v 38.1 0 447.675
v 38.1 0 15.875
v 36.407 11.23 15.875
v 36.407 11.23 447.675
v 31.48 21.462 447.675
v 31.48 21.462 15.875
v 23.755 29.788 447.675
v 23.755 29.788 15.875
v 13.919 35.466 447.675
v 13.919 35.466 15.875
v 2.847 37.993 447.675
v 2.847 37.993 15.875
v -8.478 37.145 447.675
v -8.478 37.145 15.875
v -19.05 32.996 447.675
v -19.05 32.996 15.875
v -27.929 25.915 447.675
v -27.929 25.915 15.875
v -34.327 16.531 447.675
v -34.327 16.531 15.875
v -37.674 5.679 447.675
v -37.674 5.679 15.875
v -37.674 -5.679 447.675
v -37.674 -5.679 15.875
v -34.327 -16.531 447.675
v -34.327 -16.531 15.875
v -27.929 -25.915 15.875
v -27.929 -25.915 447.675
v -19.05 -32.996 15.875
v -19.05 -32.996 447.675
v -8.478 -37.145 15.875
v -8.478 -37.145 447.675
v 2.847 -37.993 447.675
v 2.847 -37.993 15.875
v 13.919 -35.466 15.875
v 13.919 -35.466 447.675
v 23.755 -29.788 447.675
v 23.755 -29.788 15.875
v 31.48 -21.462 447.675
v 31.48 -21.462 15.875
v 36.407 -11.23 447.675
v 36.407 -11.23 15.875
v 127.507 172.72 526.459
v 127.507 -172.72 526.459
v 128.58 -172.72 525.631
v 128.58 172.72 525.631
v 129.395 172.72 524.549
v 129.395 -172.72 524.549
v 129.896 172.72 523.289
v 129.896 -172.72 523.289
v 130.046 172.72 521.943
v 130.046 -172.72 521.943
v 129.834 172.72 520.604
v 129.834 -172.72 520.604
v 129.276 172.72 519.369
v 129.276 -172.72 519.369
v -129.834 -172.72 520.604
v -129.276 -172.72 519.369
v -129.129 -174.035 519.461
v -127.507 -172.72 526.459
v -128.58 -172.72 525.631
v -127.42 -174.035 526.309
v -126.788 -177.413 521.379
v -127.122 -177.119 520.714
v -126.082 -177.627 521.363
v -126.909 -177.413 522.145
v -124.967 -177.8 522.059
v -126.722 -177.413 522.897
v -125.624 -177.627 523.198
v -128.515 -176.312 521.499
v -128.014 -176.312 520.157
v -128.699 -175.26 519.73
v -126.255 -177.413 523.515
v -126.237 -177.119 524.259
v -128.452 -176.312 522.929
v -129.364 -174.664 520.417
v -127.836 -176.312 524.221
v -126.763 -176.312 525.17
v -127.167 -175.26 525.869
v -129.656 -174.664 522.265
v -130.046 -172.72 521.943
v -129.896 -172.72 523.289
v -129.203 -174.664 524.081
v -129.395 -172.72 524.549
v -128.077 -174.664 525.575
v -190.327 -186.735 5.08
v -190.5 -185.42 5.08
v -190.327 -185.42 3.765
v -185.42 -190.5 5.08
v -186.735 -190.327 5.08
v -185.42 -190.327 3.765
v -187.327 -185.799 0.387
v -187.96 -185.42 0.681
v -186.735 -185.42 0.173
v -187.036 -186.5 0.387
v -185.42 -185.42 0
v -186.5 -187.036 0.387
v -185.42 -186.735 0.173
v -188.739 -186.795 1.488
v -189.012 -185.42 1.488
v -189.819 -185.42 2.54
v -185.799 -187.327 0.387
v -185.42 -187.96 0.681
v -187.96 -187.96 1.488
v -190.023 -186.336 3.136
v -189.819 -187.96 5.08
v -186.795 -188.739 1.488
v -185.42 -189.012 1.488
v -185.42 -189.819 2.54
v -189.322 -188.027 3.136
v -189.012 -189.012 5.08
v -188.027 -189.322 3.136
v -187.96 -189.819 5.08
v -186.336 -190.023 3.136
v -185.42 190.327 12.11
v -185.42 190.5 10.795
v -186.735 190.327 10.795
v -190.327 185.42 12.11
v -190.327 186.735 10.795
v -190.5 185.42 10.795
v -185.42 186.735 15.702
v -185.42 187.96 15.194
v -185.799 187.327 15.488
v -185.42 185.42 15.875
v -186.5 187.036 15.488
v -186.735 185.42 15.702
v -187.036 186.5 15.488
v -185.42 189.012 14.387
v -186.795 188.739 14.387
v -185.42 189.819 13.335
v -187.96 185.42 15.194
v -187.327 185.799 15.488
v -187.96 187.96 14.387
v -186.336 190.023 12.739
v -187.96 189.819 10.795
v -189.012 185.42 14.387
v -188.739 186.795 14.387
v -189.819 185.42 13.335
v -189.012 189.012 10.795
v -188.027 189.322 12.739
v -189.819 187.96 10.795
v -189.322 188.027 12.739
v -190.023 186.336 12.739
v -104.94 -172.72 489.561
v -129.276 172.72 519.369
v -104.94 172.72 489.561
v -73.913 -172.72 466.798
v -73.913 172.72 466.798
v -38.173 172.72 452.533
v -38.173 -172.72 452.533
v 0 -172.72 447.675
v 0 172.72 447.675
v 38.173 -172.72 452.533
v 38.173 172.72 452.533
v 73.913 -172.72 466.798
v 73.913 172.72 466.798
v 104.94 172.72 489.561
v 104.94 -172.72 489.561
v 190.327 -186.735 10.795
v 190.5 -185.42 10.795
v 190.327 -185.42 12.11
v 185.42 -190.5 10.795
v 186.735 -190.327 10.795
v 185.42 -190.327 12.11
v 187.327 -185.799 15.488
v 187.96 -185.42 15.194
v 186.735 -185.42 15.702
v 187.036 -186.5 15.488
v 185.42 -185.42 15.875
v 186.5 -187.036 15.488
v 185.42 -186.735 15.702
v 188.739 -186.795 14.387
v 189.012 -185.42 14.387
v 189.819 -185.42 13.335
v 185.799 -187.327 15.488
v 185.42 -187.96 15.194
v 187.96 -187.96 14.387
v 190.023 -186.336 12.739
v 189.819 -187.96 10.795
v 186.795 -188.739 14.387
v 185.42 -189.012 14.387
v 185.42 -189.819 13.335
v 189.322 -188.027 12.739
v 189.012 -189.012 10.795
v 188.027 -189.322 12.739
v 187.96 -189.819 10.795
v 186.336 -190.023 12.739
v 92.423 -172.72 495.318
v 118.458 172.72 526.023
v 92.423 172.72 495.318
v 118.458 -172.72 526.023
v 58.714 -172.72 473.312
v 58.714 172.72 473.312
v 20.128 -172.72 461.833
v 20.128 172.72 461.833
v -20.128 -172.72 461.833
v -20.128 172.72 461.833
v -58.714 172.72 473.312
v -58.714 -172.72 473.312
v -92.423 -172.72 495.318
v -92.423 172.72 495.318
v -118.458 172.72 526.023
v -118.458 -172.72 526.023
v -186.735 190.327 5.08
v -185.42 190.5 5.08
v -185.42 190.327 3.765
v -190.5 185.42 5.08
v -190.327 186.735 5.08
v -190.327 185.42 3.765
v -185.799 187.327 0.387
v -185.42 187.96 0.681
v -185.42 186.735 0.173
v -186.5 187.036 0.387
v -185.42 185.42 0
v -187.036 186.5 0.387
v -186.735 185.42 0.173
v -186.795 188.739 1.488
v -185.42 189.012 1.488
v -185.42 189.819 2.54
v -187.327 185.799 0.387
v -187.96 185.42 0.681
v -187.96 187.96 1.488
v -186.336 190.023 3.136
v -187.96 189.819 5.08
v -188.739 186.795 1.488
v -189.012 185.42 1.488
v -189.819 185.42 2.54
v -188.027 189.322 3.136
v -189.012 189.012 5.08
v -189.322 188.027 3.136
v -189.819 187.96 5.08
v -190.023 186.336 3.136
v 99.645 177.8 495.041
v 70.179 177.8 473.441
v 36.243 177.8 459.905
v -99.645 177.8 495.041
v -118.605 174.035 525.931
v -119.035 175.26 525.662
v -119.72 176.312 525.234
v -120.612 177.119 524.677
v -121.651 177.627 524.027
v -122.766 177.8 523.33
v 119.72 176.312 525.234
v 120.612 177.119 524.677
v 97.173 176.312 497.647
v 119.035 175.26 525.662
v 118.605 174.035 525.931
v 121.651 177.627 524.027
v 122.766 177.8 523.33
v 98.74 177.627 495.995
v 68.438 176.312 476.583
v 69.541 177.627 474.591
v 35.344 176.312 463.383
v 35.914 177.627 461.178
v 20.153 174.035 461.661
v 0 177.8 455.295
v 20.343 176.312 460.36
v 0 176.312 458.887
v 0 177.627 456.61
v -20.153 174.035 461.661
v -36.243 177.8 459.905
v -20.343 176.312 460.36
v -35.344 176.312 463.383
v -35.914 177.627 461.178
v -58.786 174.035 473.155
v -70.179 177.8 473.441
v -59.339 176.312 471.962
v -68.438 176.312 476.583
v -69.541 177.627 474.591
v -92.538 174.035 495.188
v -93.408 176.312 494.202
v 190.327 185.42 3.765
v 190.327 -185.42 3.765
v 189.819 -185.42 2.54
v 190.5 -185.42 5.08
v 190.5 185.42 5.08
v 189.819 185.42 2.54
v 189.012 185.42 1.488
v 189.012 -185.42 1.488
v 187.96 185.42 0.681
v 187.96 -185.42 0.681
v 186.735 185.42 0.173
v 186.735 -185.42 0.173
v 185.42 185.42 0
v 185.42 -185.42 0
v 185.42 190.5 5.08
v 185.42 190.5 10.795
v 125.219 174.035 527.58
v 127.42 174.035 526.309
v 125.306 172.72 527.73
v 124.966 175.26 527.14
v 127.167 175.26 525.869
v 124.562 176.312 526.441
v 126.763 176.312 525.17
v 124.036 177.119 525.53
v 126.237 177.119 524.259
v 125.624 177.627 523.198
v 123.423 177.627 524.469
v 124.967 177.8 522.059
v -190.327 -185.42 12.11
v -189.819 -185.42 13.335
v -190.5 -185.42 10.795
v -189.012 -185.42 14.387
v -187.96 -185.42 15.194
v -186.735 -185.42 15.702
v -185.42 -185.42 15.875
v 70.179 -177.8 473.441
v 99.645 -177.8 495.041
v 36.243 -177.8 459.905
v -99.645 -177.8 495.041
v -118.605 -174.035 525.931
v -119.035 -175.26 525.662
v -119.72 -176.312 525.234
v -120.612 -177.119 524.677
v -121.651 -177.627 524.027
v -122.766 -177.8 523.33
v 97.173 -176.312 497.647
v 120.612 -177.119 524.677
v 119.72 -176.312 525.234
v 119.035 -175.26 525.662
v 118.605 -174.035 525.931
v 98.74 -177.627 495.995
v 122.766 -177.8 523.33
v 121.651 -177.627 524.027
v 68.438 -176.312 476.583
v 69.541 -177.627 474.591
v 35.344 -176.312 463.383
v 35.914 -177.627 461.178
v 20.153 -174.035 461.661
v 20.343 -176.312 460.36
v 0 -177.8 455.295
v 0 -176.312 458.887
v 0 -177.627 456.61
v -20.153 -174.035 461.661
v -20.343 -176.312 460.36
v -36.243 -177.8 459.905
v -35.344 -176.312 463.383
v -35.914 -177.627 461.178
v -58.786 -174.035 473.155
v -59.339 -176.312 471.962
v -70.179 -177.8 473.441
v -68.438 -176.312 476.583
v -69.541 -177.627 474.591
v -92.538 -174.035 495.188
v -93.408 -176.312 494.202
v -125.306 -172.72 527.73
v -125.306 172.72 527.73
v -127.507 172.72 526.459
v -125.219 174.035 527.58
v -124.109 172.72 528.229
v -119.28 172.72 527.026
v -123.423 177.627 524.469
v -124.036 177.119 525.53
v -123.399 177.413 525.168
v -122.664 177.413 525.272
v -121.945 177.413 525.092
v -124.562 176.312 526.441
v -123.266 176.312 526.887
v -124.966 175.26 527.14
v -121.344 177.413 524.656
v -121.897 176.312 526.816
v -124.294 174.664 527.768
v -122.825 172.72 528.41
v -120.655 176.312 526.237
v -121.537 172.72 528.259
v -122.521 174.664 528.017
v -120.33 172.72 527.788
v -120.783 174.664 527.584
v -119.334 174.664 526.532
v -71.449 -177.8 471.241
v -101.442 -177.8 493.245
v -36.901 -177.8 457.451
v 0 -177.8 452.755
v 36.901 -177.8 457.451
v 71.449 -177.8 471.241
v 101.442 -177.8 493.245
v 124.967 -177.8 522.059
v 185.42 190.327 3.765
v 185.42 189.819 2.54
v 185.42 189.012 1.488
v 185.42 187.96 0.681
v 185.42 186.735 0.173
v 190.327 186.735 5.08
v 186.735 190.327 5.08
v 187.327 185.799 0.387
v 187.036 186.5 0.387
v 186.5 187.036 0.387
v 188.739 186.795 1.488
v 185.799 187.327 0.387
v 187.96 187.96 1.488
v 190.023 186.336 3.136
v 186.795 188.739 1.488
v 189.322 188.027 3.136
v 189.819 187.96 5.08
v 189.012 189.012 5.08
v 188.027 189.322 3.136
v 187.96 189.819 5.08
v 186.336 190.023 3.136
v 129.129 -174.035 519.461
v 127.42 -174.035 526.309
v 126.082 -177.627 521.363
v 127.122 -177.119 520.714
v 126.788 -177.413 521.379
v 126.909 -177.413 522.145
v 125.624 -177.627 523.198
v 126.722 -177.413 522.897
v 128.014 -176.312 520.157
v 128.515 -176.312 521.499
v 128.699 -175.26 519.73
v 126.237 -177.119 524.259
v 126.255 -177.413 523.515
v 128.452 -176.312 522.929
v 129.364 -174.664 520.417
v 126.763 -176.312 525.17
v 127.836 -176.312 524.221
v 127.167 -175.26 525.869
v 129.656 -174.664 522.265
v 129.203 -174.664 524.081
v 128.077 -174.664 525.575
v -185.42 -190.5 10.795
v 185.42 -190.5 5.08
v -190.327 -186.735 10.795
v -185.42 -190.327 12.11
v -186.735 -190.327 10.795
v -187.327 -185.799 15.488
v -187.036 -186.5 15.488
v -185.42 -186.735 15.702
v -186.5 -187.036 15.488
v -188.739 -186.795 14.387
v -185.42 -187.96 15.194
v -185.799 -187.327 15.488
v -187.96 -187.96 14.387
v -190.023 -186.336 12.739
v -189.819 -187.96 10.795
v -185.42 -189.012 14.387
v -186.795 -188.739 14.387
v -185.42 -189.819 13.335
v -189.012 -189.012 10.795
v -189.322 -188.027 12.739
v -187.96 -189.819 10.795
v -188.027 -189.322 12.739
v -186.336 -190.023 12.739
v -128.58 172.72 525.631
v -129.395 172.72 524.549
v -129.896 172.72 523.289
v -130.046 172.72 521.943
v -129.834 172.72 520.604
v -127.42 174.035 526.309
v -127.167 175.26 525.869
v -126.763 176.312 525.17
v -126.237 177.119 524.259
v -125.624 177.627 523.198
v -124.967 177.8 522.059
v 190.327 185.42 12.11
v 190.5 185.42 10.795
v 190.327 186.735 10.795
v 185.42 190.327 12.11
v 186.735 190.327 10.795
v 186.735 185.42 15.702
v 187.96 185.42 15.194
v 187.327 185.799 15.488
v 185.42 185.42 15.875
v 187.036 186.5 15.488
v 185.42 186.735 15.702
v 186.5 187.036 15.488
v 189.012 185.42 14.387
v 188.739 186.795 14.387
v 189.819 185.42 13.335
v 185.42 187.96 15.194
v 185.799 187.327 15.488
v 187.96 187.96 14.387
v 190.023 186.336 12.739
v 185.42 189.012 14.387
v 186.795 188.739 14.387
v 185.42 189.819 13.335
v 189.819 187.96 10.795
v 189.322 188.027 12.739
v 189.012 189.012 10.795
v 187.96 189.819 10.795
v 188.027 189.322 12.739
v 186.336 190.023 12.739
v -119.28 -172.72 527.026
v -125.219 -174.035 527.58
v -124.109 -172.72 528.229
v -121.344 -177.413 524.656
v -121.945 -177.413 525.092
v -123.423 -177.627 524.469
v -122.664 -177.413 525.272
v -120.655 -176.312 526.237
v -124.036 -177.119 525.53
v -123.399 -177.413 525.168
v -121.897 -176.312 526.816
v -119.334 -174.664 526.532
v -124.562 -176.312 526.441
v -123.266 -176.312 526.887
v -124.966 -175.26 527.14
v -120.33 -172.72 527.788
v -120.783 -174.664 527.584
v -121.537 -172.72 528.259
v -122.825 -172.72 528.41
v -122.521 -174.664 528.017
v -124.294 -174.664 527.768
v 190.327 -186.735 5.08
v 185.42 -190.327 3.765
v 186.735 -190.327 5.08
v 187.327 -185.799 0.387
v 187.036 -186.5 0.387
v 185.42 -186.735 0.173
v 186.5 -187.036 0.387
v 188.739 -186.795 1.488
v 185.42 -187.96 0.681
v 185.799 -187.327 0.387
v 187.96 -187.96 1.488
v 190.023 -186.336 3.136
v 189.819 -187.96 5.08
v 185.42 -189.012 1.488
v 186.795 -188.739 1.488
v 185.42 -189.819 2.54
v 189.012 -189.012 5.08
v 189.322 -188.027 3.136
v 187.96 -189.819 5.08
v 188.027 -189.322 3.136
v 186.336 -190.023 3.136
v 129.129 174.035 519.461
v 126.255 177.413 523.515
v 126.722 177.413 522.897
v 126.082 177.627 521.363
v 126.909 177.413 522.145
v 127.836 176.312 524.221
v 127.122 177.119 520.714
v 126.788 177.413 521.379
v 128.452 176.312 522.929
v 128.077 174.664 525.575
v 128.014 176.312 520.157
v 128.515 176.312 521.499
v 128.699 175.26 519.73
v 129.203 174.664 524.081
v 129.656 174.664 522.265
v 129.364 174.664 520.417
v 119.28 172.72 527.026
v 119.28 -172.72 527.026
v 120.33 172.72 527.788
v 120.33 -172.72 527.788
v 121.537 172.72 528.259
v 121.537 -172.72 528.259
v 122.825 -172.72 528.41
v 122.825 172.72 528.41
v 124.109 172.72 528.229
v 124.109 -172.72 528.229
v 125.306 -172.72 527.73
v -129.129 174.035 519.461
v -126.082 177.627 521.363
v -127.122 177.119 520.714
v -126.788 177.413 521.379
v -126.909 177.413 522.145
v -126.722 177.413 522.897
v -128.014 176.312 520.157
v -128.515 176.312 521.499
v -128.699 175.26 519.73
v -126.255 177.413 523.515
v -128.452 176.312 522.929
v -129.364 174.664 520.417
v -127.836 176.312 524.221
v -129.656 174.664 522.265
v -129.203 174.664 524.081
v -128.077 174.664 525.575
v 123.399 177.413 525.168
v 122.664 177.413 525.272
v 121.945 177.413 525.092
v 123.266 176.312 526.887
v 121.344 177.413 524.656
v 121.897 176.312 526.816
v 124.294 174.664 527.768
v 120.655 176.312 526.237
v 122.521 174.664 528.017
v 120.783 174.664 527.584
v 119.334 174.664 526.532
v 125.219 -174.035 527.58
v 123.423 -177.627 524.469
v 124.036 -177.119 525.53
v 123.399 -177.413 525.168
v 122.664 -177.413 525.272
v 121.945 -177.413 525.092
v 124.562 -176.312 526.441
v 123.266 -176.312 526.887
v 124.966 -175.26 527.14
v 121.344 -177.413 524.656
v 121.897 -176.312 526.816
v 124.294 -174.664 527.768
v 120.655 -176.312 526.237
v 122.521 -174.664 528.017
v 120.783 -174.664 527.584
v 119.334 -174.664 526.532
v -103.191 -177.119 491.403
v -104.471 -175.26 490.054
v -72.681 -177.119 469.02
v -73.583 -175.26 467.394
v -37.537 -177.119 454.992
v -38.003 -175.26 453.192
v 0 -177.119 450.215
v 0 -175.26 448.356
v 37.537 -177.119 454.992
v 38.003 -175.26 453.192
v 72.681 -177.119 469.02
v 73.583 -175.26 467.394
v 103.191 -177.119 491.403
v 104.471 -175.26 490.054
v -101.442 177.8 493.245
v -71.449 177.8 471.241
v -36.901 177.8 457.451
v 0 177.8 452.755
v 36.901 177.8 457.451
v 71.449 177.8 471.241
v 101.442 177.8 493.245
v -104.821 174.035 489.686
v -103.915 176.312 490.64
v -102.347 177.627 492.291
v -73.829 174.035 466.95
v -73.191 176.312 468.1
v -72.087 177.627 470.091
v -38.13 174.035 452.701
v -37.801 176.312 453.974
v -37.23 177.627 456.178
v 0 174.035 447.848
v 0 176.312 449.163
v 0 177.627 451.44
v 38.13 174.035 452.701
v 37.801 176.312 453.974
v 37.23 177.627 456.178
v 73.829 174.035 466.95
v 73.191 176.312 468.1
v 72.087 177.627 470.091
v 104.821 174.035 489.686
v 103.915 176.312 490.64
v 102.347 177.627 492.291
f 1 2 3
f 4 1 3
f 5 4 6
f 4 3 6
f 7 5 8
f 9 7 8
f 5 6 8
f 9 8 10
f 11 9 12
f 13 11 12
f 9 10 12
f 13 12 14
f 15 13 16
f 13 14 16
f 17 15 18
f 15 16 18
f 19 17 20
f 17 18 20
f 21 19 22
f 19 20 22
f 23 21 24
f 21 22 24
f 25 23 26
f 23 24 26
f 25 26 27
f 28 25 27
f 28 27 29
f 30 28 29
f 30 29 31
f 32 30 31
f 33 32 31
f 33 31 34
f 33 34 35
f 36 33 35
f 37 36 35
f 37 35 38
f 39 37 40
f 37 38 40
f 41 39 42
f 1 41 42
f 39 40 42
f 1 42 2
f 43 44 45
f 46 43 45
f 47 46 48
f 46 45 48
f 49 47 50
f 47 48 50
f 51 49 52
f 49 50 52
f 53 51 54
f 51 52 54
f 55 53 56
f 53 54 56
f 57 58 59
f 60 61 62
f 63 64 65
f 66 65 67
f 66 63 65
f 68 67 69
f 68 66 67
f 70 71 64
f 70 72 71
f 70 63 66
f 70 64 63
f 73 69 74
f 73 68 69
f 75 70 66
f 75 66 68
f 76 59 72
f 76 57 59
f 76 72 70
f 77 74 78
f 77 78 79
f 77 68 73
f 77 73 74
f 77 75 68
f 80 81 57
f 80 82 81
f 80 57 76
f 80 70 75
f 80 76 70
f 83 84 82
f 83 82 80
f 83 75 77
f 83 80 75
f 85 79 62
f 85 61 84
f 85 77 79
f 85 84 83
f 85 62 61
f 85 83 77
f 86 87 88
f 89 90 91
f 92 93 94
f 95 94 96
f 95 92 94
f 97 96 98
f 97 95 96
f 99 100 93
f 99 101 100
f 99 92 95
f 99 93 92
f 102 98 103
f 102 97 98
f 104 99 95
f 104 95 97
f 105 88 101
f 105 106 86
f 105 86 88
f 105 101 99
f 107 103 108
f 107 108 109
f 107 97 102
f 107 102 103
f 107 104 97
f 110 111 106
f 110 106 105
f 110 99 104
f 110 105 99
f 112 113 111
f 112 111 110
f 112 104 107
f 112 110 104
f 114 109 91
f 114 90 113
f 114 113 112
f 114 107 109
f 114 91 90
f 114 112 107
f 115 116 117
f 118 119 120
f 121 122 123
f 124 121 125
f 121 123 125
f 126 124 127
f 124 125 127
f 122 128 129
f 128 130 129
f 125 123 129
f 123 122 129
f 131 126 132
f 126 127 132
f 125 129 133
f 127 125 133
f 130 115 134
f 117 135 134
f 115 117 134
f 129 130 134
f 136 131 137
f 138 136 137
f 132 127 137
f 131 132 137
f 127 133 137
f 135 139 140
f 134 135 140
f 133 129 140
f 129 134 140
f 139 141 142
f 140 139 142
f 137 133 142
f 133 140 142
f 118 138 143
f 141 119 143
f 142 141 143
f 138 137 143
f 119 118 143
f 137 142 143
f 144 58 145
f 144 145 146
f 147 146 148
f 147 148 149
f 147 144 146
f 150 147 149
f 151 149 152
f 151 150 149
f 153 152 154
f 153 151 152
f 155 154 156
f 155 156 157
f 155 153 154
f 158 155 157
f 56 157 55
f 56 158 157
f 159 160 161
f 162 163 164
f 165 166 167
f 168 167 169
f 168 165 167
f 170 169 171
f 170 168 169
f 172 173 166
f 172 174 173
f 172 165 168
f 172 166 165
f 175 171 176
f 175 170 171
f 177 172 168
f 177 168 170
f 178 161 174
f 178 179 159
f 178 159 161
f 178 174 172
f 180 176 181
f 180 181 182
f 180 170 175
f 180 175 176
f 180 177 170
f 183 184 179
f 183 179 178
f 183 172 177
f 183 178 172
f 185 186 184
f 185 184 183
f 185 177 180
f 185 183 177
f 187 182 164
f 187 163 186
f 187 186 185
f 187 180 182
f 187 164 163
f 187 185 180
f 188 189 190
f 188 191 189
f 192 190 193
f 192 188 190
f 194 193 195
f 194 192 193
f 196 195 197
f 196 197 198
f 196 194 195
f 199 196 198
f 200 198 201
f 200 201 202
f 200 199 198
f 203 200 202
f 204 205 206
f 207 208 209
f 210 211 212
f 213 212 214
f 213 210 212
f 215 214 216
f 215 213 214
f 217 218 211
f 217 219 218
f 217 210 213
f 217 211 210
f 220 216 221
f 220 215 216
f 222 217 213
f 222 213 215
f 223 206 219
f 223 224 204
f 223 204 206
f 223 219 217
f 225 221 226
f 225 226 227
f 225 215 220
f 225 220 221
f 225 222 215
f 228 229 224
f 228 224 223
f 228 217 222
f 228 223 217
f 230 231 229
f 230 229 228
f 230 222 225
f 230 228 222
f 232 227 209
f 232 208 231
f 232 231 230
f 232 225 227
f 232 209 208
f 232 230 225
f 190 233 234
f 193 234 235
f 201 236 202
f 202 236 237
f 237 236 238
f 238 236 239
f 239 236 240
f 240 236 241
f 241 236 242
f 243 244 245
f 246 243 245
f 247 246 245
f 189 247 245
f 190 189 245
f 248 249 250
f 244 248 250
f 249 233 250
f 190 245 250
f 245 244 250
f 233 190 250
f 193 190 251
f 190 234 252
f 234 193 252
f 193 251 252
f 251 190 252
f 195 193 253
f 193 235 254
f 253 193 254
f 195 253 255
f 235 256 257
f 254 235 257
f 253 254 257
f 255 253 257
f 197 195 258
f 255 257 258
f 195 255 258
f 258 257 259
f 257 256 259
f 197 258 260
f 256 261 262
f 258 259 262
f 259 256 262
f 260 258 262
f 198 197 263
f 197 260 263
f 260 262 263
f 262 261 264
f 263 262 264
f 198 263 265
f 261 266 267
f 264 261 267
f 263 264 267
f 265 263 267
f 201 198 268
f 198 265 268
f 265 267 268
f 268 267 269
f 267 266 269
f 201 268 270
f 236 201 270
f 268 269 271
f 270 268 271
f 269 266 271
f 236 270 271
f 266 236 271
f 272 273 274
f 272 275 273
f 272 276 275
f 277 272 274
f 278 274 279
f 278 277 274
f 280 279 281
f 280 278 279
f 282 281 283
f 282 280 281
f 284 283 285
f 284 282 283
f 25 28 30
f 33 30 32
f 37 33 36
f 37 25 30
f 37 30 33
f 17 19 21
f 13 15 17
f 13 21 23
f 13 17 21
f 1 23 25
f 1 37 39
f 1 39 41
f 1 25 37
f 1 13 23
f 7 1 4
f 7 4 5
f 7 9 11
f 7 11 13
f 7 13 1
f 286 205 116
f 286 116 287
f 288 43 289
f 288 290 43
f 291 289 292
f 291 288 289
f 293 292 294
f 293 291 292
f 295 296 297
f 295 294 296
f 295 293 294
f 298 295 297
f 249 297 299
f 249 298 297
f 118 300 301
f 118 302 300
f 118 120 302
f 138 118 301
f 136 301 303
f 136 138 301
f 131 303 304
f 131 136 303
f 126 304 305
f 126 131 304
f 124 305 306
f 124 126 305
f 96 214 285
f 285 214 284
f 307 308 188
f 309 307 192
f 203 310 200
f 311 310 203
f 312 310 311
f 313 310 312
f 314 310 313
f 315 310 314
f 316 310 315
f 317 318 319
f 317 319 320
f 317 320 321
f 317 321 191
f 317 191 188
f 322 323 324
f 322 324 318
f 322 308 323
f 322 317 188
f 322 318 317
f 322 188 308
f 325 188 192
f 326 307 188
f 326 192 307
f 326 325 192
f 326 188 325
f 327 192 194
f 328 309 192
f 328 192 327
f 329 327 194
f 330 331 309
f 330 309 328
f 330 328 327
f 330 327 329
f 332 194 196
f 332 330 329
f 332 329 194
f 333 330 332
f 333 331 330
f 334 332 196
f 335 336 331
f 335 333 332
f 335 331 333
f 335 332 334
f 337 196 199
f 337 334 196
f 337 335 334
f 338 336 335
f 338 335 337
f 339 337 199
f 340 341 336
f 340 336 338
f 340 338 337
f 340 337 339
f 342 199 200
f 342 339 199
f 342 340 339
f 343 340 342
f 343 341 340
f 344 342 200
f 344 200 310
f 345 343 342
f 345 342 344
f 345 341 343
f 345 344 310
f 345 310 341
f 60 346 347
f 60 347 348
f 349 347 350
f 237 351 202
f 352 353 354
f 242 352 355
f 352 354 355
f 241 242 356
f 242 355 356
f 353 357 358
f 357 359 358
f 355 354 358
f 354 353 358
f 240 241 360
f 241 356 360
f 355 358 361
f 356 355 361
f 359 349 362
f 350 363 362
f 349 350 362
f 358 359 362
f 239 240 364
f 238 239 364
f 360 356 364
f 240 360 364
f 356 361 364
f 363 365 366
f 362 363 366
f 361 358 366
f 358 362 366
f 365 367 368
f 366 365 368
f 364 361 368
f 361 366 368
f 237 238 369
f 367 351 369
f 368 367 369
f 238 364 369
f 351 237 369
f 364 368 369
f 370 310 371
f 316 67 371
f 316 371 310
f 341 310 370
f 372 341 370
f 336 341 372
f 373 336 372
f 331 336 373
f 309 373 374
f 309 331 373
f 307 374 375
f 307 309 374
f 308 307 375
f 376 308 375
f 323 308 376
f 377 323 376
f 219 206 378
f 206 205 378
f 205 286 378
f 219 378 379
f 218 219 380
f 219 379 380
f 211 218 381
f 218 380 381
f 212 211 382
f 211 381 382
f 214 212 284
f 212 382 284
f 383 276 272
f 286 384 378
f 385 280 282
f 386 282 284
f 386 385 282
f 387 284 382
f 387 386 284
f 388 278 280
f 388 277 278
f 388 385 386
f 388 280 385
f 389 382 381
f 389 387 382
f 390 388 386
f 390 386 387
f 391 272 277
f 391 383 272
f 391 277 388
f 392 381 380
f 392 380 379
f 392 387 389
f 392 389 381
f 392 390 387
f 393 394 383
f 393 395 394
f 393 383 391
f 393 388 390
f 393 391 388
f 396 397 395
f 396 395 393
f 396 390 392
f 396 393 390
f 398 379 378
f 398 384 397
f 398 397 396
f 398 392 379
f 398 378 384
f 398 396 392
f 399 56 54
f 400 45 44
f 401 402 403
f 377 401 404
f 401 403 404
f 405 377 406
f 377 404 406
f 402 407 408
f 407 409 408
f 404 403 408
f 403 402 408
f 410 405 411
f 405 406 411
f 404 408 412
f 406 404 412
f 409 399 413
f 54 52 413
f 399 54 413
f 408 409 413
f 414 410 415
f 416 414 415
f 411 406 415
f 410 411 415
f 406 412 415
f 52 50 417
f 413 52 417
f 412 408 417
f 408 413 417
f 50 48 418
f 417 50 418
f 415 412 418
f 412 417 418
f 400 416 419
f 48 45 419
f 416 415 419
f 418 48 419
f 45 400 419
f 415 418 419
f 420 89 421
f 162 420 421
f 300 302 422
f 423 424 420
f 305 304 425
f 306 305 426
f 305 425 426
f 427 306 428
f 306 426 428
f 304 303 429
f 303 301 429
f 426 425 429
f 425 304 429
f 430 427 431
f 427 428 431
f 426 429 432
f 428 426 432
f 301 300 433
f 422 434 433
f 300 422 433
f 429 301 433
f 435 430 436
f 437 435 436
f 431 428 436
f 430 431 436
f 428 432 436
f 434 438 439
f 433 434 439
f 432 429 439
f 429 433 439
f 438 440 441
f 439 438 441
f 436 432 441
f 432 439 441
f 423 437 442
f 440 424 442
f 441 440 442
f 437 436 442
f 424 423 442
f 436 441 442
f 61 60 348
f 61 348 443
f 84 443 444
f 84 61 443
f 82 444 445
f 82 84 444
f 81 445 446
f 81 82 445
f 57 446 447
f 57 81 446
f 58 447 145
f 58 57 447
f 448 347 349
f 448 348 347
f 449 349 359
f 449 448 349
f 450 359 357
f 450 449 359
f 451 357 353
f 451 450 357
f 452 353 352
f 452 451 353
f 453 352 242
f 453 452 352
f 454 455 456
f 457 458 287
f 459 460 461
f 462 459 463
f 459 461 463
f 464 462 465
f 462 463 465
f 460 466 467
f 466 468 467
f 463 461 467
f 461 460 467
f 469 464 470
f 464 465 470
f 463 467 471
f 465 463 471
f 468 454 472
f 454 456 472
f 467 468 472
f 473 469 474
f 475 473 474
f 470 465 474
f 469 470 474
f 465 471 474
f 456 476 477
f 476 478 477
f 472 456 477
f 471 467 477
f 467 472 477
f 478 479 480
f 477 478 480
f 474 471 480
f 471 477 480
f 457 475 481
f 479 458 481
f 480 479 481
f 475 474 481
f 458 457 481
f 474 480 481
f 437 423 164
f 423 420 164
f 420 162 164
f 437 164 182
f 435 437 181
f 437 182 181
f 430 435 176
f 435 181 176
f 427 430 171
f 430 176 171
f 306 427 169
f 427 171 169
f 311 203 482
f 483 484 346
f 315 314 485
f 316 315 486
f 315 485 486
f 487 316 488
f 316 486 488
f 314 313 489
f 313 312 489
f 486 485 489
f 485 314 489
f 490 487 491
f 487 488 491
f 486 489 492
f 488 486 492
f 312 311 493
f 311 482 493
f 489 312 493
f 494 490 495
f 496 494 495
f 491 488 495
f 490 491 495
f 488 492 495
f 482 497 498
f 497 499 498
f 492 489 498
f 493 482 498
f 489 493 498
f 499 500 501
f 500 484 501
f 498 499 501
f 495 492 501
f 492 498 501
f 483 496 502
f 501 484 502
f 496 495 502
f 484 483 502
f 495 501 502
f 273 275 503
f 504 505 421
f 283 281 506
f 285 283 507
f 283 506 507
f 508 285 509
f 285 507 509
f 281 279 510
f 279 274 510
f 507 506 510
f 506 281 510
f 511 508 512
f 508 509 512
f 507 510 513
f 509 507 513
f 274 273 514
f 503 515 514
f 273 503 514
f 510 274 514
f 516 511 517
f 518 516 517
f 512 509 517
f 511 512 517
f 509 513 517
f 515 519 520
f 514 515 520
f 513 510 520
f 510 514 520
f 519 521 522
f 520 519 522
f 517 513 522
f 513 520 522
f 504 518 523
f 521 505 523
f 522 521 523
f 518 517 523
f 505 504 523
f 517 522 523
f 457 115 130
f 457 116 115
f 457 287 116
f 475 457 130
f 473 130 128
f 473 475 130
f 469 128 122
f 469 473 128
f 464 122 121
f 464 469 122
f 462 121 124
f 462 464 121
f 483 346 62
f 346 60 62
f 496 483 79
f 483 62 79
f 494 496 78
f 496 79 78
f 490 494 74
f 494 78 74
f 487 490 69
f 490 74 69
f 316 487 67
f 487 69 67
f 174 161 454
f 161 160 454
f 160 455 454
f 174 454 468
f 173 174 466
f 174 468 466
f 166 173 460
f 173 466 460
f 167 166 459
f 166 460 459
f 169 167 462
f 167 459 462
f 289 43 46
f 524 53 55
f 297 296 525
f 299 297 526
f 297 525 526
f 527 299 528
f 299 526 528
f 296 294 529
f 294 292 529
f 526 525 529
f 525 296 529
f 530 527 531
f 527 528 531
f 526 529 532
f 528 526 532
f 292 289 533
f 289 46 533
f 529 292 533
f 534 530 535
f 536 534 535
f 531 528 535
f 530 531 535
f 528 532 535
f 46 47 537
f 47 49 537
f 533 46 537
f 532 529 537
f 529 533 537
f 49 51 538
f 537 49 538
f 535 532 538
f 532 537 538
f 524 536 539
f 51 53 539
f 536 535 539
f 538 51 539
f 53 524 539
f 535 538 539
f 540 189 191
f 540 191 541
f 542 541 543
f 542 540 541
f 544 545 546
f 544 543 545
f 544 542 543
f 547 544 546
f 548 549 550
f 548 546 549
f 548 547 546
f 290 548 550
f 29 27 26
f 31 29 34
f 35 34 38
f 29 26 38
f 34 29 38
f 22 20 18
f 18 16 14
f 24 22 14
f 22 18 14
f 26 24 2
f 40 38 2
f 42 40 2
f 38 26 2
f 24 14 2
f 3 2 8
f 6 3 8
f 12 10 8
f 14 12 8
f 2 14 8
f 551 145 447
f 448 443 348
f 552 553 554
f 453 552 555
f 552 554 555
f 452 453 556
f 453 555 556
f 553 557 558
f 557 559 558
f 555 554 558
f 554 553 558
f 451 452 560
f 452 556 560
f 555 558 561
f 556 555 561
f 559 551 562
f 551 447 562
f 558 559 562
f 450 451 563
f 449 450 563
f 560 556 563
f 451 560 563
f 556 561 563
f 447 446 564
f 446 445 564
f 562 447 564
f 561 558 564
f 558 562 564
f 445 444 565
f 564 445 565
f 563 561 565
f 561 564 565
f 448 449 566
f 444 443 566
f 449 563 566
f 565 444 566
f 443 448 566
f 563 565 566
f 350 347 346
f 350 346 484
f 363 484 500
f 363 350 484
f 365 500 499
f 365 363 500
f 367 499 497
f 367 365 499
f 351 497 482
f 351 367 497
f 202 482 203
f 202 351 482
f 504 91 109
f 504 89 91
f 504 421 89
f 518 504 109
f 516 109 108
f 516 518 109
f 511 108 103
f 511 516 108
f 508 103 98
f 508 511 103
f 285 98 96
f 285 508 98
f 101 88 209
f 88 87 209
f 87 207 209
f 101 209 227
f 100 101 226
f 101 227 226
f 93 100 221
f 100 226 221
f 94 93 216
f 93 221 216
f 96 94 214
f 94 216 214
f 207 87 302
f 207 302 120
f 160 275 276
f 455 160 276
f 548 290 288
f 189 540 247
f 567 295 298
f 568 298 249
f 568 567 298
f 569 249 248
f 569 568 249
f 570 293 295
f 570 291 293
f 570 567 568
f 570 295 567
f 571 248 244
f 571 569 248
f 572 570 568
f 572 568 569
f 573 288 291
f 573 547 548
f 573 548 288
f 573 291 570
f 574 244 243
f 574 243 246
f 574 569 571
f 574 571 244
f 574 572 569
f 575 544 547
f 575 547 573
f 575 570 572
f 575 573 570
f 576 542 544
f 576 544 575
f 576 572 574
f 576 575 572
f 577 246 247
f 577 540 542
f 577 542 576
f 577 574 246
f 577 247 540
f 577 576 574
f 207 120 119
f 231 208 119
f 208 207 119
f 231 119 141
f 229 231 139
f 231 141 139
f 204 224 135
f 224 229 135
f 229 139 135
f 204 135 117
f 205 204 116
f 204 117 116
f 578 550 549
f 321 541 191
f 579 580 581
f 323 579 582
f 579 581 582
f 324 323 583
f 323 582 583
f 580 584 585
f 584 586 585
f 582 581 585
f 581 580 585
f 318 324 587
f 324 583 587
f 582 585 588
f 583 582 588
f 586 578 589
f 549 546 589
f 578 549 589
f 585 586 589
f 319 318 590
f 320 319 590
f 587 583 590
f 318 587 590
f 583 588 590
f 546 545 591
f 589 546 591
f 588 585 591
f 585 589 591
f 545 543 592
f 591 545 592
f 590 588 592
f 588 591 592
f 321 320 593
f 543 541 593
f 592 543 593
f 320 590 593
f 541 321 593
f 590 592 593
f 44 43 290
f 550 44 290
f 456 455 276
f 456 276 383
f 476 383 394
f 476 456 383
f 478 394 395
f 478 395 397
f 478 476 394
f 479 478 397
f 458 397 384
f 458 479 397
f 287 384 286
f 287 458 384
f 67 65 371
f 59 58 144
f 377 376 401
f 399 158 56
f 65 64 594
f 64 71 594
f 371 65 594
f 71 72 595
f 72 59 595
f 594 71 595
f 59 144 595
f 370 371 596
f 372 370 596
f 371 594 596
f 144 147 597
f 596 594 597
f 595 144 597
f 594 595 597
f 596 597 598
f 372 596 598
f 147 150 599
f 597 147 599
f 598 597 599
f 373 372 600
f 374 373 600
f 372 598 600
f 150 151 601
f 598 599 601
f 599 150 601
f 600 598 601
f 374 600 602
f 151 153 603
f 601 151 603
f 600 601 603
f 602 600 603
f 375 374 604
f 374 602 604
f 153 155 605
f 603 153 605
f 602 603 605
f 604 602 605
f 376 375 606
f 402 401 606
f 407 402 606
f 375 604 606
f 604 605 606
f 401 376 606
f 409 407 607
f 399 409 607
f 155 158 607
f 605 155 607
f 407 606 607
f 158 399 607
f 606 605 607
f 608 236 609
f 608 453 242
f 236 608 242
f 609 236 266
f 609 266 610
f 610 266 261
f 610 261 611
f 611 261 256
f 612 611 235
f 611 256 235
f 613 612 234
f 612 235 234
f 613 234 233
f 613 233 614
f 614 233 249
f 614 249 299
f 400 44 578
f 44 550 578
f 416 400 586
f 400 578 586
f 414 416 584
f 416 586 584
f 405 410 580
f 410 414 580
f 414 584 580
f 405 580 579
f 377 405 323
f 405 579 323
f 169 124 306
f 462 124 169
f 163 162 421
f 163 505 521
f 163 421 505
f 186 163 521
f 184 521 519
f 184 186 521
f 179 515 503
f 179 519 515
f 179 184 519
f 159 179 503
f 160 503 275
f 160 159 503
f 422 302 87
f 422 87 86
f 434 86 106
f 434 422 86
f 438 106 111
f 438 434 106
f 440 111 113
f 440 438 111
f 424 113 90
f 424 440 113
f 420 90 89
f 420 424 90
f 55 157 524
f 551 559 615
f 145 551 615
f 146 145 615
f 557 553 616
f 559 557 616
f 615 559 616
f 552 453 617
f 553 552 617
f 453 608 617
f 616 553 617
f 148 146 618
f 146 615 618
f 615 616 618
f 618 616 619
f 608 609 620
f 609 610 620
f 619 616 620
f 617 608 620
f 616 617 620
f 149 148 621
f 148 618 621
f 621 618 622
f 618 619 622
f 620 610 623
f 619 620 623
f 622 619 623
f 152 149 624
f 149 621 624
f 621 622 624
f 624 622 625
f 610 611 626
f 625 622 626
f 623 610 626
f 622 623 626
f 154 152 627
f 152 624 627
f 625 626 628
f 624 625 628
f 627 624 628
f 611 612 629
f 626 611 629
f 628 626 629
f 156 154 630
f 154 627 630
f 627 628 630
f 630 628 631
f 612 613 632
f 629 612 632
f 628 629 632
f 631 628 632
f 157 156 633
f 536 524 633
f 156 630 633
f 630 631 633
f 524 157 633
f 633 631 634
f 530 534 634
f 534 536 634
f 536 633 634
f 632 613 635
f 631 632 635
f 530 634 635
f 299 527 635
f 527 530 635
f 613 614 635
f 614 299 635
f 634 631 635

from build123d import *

# Parameters (mm, degrees)
F0_W      = 381
F0_H      = 381
F1_DEPTH  = 15.875
F2_R      = 38.1
F3_DEPTH  = 431.8
F5_DEPTH  = 177.8
F6_R      = 5.08
F7_R      = 5.08
F10_DEPTH = 177.8
F11_R     = 5.08
F12_R     = 5.08


with BuildPart() as f1:
    # F0 (on Top) → F1 (new body)
    with BuildSketch(Plane.XY):
        Rectangle(F0_W, F0_H)
    extrude(amount=F1_DEPTH)

    # F12
    f12_edges = [f1.edges().sort_by_distance(p)[0] for p in [
        (190.5, -190.5, 7.9375),
        (190.5, 190.5, 7.9375),
        (-190.5, -190.5, 7.9375),
        (-190.5, 190.5, 7.9375),
        (190.5, 0, 0),
        (0, 190.5, 0),
        (-190.5, 0, 0),
        (0, -190.5, 0),
        (190.5, 0, 15.875),
        (0, 190.5, 15.875),
        (-190.5, 0, 15.875),
        (0, -190.5, 15.875),
    ]]
    fillet(f12_edges, radius=F12_R)


with BuildPart() as f3:
    # F2 (on face) → F3 (new body)
    with BuildSketch(Plane.XY.offset(15.875)):
        Circle(F2_R)
    extrude(amount=F3_DEPTH)


with BuildPart() as f5:
    # F4 (on Front) → F5 (new body, symmetric)
    with BuildSketch(Plane.XZ):
        with BuildLine():
            ThreePointArc((131.982272, -76.2), (0, -152.4), (-131.982272, -76.2))
            Line((-131.982272, -76.2), (-142.980794, -82.55))
            ThreePointArc((-142.980794, -82.55), (0, -165.1), (142.980794, -82.55))
            Line((142.980794, -82.55), (131.982272, -76.2))
        make_face()
    extrude(amount=F5_DEPTH, both=True)

    # F6
    f6_edges = [f5.edges().sort_by_distance(p)[0] for p in [
        (137.481533, -177.8, -79.375),
        (137.481533, 177.8, -79.375),
        (-137.481533, 177.8, -79.375),
        (-137.481533, -177.8, -79.375),
    ]]
    fillet(f6_edges, radius=F6_R)

    # F7
    f7_edges = [f5.edges().sort_by_distance(p)[0] for p in [
        (131.982272, 0, -76.2),
        (131.231878, 176.312407, -77.485187),
        (131.231878, -176.312407, -77.485187),
        (0, 177.8, -152.4),
        (0, -177.8, -152.4),
        (-131.231878, 176.312407, -77.485187),
        (-131.231878, -176.312407, -77.485187),
        (-131.982272, 0, -76.2),
        (0, 177.8, -165.1),
        (-142.230907, 176.312362, -83.835428),
        (142.230907, 176.312362, -83.835428),
        (-142.980794, 0, -82.55),
        (142.980794, 0, -82.55),
        (-142.230907, -176.312362, -83.835428),
        (142.230907, -176.312362, -83.835428),
        (0, -177.8, -165.1),
    ]]
    fillet(f7_edges, radius=F7_R)


with BuildPart() as f10:
    # F9 (on Front) → F10 (new body, symmetric)
    with BuildSketch(Plane.XZ):
        with BuildLine():
            Line((-120.983739, 530.225005), (-131.982272, 523.875))
            ThreePointArc((-131.982272, 523.875), (0, 447.675), (131.982272, 523.875))
            Line((131.982272, 523.875), (120.983739, 530.225005))
            ThreePointArc((120.983739, 530.225005), (0, 460.375011), (-120.983739, 530.225005))
        make_face()
    extrude(amount=F10_DEPTH, both=True)

    # F11
    f11_edges = [f10.edges().sort_by_distance(p)[0] for p in [
        (126.483005, -177.8, 527.050003),
        (-126.483005, -177.8, 527.050003),
        (126.483005, 177.8, 527.050003),
        (-126.483005, 177.8, 527.050003),
        (0, 177.8, 460.375011),
        (-120.983739, 0, 530.225005),
        (0, -177.8, 460.375011),
        (120.983739, 0, 530.225005),
        (-131.982272, 0, 523.875),
        (0, 177.8, 447.675),
        (131.982272, 0, 523.875),
        (0, -177.8, 447.675),
    ]]
    fillet(f11_edges, radius=F11_R)


solid = Compound([f1.part, f3.part, f10.part])
